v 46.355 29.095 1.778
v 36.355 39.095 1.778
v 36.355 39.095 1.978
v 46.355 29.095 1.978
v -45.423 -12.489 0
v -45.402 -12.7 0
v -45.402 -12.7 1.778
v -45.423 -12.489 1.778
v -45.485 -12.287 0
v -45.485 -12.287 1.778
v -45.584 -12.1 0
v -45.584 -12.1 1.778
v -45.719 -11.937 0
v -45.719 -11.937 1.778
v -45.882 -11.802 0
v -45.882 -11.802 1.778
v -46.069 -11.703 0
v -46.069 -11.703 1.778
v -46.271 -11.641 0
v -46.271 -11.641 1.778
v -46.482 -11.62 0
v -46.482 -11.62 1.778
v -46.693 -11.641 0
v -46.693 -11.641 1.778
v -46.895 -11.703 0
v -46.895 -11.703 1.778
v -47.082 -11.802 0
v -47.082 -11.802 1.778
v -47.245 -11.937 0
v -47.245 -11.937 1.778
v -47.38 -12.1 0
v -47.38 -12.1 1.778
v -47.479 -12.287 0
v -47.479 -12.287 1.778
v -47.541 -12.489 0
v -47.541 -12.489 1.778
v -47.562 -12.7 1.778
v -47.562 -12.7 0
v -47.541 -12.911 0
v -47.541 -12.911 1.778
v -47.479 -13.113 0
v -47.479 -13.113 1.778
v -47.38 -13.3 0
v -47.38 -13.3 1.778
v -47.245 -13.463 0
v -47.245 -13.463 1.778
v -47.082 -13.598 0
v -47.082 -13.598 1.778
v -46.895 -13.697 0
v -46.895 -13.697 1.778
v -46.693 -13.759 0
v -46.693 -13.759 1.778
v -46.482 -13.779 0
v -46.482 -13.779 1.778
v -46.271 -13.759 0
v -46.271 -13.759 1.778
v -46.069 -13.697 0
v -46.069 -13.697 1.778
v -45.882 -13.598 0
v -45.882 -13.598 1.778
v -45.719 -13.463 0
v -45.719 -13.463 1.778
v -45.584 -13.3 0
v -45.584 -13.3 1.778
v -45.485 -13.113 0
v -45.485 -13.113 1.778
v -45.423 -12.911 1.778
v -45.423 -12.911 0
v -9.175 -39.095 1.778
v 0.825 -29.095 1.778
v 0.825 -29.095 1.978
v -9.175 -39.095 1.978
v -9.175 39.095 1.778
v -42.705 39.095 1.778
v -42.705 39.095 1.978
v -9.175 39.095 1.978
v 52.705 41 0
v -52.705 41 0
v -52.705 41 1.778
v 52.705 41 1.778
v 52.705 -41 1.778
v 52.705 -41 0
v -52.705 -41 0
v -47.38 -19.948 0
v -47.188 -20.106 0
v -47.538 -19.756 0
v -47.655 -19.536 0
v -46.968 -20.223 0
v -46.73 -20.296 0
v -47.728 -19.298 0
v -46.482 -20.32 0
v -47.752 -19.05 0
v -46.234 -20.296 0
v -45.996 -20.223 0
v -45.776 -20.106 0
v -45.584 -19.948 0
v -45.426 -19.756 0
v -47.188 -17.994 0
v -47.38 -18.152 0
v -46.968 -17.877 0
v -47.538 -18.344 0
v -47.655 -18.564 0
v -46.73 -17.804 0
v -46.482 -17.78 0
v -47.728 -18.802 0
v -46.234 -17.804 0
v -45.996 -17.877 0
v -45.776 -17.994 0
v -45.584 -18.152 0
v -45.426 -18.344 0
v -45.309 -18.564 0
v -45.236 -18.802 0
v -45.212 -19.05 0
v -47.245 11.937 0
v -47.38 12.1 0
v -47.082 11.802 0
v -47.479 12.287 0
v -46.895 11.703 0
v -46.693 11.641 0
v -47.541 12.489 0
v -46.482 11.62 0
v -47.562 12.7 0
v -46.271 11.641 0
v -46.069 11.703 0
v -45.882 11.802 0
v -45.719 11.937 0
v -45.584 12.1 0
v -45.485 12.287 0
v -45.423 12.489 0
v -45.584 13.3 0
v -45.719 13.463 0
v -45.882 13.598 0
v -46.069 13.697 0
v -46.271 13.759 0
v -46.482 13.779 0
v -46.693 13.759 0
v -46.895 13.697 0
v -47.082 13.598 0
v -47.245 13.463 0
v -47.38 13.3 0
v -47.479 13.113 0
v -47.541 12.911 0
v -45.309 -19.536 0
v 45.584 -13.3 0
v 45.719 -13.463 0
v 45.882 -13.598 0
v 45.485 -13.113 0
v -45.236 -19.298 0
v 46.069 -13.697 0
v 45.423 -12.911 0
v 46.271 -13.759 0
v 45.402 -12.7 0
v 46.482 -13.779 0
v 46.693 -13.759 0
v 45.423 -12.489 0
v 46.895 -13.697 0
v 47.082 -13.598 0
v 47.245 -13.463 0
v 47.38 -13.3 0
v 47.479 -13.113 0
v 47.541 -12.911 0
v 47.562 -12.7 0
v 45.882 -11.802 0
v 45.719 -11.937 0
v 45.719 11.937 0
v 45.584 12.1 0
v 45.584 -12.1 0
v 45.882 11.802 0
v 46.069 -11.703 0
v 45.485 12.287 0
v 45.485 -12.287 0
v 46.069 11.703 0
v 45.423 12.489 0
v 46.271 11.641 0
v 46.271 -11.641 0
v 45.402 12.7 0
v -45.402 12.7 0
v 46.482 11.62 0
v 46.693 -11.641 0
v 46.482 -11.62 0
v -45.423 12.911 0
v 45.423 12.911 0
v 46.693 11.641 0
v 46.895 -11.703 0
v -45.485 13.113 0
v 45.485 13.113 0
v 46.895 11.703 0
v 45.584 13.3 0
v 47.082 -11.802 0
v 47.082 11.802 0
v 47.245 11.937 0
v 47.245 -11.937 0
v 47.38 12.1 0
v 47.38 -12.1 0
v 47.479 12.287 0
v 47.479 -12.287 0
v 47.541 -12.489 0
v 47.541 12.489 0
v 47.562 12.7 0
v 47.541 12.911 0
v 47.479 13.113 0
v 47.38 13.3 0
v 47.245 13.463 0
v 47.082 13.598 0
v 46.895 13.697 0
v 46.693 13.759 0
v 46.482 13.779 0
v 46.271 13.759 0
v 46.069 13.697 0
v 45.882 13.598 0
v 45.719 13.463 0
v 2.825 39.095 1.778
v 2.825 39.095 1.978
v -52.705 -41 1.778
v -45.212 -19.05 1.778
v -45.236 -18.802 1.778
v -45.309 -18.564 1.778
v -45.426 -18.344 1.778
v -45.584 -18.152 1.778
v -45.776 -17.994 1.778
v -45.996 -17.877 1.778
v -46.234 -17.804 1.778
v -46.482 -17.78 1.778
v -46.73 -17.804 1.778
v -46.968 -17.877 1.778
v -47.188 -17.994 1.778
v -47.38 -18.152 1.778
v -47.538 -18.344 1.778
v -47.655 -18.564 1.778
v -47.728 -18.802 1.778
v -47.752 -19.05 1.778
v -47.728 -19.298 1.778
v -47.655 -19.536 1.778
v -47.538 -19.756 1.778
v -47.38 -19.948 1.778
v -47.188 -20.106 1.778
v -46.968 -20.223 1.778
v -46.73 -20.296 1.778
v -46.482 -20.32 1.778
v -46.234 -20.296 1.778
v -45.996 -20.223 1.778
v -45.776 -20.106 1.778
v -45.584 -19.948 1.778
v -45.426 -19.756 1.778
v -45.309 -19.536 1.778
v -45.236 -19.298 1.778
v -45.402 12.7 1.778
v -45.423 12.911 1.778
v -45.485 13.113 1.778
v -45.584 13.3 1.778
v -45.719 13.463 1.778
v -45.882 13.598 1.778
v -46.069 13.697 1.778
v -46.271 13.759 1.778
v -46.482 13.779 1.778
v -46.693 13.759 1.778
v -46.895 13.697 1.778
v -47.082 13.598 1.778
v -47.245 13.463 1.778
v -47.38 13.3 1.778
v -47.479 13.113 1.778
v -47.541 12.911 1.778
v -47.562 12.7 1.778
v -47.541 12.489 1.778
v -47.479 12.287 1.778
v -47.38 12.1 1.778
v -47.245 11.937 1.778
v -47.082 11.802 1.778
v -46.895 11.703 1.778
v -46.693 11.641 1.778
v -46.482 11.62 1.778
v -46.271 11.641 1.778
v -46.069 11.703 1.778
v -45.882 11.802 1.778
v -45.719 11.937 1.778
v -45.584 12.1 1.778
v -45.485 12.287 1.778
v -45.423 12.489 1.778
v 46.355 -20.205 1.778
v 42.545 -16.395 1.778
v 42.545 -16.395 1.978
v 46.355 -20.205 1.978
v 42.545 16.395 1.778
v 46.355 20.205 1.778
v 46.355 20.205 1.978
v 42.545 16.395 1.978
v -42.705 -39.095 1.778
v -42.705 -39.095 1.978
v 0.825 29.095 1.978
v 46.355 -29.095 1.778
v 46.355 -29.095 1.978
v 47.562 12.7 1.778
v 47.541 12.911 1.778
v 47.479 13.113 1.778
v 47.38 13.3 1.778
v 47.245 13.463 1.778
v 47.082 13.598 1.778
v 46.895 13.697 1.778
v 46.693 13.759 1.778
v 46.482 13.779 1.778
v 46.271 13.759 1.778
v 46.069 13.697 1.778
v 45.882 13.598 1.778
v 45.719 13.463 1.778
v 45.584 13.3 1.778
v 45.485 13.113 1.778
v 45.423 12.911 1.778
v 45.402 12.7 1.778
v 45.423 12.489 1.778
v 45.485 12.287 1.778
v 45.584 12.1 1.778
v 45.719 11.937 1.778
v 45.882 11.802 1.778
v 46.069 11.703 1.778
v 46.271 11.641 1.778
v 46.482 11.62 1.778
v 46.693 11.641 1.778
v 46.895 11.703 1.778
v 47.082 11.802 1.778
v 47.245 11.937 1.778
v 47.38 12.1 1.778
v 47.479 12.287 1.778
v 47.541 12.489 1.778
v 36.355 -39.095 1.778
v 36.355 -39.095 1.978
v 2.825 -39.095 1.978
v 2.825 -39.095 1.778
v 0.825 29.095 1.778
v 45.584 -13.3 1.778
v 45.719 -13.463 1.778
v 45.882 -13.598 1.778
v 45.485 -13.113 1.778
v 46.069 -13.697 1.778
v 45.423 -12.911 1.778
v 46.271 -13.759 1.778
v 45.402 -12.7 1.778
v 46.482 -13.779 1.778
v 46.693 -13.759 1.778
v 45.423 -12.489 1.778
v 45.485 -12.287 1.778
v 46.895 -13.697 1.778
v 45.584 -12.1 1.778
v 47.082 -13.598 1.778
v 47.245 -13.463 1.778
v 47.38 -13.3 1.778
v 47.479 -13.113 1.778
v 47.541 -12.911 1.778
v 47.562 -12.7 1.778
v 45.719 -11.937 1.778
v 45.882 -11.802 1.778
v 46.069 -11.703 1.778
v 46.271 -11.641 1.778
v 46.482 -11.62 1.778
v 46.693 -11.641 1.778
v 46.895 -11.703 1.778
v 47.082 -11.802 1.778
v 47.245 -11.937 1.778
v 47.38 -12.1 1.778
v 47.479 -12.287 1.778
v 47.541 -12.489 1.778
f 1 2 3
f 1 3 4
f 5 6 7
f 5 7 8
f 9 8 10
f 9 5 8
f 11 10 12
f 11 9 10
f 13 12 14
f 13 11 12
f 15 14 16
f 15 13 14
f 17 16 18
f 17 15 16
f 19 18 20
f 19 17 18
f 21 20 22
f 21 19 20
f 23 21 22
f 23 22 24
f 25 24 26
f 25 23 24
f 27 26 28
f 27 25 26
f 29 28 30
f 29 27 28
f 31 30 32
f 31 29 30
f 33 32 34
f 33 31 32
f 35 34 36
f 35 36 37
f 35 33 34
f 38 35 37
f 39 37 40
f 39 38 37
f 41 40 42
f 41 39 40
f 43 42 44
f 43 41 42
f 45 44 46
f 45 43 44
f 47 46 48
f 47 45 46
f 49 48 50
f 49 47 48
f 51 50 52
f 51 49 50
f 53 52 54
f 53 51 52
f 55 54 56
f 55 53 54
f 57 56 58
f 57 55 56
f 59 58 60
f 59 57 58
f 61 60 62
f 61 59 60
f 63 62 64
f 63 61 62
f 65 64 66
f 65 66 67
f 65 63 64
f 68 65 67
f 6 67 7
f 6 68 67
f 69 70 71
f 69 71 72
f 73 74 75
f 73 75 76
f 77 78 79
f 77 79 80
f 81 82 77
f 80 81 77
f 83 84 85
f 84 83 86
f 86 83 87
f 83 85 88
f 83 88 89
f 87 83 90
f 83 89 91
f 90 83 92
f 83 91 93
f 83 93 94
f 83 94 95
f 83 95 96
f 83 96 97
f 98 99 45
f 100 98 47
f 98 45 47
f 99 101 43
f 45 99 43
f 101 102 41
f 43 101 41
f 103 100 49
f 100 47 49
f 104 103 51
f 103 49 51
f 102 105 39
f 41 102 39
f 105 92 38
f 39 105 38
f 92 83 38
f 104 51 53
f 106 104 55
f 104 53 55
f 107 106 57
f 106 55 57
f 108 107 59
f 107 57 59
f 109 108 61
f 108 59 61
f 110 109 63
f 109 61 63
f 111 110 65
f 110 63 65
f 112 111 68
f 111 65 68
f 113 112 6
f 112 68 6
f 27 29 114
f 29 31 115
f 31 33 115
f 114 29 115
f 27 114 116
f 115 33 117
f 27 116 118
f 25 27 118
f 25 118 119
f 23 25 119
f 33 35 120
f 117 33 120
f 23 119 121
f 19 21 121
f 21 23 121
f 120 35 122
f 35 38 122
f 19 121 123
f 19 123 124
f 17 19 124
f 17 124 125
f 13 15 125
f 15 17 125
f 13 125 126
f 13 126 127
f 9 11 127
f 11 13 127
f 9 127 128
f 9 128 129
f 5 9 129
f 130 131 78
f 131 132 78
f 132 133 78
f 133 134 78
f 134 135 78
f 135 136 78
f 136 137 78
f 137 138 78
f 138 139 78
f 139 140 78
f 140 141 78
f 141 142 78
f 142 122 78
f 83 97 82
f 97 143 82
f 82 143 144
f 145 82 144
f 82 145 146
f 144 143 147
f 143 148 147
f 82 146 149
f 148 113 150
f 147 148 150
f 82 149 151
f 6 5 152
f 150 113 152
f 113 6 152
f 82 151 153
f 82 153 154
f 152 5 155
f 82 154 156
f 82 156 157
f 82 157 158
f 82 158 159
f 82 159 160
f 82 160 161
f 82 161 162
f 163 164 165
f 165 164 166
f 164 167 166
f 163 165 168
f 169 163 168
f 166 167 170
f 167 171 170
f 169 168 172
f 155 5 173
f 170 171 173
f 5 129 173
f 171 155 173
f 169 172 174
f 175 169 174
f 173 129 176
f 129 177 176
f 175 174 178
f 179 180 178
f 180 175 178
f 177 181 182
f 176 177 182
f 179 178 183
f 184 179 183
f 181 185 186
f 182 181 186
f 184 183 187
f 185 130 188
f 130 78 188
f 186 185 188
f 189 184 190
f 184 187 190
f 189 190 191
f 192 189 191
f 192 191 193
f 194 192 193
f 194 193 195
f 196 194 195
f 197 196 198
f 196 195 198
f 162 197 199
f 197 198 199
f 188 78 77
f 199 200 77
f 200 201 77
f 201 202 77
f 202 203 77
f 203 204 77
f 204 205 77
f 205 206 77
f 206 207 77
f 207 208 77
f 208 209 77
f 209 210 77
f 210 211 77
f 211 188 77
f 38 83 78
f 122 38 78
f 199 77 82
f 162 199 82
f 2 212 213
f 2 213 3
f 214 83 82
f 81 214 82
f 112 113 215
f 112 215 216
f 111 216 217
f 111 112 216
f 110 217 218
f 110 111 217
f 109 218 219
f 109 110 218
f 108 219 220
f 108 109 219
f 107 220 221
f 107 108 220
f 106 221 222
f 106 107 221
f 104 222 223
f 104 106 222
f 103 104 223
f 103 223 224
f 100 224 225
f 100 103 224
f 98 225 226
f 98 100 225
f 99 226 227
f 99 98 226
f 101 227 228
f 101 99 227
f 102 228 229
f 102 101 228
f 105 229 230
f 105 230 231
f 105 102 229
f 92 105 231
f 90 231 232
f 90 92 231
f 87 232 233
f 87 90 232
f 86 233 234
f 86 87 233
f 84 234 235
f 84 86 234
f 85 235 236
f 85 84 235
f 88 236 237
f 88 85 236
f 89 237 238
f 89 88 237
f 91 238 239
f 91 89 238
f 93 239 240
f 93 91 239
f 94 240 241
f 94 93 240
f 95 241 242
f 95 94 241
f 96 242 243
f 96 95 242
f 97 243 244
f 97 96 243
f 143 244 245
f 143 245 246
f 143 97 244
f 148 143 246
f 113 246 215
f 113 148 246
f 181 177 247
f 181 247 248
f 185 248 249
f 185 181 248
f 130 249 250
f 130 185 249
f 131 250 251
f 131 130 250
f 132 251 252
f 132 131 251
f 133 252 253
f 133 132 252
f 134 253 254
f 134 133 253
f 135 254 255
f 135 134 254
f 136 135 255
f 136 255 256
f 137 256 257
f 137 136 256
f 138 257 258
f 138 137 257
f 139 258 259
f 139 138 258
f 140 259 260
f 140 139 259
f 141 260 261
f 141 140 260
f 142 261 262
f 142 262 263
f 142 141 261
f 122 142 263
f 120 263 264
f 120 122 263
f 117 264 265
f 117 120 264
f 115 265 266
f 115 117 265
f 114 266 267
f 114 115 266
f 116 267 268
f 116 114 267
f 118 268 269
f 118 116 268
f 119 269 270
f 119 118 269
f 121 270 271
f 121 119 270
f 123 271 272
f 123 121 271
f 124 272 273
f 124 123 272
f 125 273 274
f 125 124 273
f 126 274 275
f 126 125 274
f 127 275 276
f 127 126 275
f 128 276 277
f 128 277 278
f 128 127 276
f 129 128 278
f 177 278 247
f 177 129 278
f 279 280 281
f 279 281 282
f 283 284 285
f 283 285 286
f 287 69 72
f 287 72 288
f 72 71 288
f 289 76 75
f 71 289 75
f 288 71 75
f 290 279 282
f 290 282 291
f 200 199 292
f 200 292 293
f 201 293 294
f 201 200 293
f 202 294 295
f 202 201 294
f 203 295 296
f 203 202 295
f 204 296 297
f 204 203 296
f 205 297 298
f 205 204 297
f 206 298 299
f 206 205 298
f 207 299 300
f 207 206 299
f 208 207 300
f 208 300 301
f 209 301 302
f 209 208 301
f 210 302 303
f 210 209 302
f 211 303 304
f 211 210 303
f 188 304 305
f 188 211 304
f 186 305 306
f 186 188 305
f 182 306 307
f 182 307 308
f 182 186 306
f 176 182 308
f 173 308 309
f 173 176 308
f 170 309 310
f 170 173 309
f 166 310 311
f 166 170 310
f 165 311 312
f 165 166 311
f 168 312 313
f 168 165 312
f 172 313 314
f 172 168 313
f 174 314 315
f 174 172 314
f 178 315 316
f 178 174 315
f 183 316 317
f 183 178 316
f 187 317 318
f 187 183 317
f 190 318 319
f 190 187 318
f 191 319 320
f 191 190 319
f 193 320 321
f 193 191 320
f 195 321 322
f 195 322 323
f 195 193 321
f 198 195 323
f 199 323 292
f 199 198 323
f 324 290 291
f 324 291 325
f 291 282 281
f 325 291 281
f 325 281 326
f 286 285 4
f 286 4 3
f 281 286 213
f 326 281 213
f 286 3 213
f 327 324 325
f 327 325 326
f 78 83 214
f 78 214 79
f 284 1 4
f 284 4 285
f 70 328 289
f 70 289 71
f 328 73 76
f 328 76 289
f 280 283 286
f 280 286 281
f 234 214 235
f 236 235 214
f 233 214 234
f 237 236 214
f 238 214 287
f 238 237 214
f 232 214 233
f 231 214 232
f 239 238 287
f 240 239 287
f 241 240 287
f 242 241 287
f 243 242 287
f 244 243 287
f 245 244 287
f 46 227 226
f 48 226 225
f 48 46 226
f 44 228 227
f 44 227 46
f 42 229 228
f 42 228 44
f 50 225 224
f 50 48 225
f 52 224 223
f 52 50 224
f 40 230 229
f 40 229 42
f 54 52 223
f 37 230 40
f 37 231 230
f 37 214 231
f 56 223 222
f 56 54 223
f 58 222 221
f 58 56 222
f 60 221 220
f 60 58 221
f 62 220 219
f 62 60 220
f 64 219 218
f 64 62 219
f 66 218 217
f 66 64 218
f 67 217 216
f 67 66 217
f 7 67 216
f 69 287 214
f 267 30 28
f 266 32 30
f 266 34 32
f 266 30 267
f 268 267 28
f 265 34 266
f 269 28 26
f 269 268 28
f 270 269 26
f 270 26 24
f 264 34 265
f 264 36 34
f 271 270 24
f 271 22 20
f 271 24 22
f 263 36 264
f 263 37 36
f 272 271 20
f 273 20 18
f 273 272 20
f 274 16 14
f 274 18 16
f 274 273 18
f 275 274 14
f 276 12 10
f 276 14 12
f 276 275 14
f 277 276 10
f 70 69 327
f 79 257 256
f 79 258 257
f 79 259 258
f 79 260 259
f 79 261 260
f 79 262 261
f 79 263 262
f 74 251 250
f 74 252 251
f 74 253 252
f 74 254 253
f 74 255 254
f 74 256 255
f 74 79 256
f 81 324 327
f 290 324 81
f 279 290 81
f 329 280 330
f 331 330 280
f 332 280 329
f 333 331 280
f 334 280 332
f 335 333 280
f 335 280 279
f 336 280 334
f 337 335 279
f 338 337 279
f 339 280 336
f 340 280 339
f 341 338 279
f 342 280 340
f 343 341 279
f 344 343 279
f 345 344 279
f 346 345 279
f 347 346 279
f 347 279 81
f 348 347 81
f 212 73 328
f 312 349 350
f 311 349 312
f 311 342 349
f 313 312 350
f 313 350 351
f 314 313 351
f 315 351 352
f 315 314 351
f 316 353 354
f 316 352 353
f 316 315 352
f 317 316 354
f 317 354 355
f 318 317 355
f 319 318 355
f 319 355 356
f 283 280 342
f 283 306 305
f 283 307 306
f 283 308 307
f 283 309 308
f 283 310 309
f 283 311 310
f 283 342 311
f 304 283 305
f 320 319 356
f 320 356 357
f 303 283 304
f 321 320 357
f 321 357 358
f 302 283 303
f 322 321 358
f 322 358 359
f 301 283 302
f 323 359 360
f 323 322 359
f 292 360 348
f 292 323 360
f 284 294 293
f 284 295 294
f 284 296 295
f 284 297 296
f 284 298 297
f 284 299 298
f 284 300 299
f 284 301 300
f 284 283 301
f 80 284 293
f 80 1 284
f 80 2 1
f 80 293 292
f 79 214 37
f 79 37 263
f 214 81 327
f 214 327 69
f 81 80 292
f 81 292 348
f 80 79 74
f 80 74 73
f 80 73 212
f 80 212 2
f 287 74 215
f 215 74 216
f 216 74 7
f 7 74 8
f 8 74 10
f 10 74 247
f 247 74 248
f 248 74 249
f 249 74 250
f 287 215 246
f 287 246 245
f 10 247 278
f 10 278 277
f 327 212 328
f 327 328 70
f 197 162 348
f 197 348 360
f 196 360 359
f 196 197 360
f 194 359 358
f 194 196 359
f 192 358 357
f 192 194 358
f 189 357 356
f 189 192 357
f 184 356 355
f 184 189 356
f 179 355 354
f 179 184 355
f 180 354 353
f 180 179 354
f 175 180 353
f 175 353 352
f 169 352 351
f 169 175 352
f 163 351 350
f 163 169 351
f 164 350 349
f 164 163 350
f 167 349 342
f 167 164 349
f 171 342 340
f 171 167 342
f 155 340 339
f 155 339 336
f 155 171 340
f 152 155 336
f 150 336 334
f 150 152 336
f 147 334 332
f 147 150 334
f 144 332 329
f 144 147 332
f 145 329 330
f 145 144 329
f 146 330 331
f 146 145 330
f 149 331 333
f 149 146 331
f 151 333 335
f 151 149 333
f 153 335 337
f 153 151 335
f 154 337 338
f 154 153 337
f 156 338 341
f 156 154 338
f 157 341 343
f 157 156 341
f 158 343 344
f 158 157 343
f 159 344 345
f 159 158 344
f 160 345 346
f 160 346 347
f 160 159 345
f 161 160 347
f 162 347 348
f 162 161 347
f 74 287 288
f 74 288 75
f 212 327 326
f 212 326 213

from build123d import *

# Parameters (mm, degrees)
SKETCH1_W           = 105.41
SKETCH1_H           = 82
SKETCH1_R           = 1.0795
SKETCH1_R_2         = 1.27
BOSS_EXTRUDE1_DEPTH = 1.778
BOSS_EXTRUDE2_DEPTH = 0.2


with BuildPart() as part:
    # Sketch1 → Boss-Extrude1 (new body)
    with BuildSketch(Plane.XY):
        Rectangle(SKETCH1_W, SKETCH1_H)
        with Locations((46.482, 12.7)):
            Circle(SKETCH1_R, mode=Mode.SUBTRACT)
        with Locations((46.482, -12.7)):
            Circle(SKETCH1_R, mode=Mode.SUBTRACT)
        with Locations((-46.482, 12.7)):
            Circle(SKETCH1_R, mode=Mode.SUBTRACT)
        with Locations((-46.482, -12.7)):
            Circle(SKETCH1_R, mode=Mode.SUBTRACT)
        with Locations((-46.482, -19.05)):
            Circle(SKETCH1_R_2, mode=Mode.SUBTRACT)
    extrude(amount=BOSS_EXTRUDE1_DEPTH)

    # Sketch2 → Boss-Extrude2 (add)
    with BuildSketch(Plane.XY.offset(1.778)):
        Polygon((-9.175, 39.095), (0.825, 29.095), (0.825, -29.095), (-9.175, -39.095), (-42.705, -39.095), (-42.705, 39.095), align=None)
        Polygon((46.355, 20.205), (42.545, 16.395), (42.545, -16.395), (46.355, -20.205), (46.355, -29.095), (36.355, -39.095), (2.825, -39.095), (2.825, 39.095), (36.355, 39.095), (46.355, 29.095), align=None)
    extrude(amount=BOSS_EXTRUDE2_DEPTH)


solid = part.part
